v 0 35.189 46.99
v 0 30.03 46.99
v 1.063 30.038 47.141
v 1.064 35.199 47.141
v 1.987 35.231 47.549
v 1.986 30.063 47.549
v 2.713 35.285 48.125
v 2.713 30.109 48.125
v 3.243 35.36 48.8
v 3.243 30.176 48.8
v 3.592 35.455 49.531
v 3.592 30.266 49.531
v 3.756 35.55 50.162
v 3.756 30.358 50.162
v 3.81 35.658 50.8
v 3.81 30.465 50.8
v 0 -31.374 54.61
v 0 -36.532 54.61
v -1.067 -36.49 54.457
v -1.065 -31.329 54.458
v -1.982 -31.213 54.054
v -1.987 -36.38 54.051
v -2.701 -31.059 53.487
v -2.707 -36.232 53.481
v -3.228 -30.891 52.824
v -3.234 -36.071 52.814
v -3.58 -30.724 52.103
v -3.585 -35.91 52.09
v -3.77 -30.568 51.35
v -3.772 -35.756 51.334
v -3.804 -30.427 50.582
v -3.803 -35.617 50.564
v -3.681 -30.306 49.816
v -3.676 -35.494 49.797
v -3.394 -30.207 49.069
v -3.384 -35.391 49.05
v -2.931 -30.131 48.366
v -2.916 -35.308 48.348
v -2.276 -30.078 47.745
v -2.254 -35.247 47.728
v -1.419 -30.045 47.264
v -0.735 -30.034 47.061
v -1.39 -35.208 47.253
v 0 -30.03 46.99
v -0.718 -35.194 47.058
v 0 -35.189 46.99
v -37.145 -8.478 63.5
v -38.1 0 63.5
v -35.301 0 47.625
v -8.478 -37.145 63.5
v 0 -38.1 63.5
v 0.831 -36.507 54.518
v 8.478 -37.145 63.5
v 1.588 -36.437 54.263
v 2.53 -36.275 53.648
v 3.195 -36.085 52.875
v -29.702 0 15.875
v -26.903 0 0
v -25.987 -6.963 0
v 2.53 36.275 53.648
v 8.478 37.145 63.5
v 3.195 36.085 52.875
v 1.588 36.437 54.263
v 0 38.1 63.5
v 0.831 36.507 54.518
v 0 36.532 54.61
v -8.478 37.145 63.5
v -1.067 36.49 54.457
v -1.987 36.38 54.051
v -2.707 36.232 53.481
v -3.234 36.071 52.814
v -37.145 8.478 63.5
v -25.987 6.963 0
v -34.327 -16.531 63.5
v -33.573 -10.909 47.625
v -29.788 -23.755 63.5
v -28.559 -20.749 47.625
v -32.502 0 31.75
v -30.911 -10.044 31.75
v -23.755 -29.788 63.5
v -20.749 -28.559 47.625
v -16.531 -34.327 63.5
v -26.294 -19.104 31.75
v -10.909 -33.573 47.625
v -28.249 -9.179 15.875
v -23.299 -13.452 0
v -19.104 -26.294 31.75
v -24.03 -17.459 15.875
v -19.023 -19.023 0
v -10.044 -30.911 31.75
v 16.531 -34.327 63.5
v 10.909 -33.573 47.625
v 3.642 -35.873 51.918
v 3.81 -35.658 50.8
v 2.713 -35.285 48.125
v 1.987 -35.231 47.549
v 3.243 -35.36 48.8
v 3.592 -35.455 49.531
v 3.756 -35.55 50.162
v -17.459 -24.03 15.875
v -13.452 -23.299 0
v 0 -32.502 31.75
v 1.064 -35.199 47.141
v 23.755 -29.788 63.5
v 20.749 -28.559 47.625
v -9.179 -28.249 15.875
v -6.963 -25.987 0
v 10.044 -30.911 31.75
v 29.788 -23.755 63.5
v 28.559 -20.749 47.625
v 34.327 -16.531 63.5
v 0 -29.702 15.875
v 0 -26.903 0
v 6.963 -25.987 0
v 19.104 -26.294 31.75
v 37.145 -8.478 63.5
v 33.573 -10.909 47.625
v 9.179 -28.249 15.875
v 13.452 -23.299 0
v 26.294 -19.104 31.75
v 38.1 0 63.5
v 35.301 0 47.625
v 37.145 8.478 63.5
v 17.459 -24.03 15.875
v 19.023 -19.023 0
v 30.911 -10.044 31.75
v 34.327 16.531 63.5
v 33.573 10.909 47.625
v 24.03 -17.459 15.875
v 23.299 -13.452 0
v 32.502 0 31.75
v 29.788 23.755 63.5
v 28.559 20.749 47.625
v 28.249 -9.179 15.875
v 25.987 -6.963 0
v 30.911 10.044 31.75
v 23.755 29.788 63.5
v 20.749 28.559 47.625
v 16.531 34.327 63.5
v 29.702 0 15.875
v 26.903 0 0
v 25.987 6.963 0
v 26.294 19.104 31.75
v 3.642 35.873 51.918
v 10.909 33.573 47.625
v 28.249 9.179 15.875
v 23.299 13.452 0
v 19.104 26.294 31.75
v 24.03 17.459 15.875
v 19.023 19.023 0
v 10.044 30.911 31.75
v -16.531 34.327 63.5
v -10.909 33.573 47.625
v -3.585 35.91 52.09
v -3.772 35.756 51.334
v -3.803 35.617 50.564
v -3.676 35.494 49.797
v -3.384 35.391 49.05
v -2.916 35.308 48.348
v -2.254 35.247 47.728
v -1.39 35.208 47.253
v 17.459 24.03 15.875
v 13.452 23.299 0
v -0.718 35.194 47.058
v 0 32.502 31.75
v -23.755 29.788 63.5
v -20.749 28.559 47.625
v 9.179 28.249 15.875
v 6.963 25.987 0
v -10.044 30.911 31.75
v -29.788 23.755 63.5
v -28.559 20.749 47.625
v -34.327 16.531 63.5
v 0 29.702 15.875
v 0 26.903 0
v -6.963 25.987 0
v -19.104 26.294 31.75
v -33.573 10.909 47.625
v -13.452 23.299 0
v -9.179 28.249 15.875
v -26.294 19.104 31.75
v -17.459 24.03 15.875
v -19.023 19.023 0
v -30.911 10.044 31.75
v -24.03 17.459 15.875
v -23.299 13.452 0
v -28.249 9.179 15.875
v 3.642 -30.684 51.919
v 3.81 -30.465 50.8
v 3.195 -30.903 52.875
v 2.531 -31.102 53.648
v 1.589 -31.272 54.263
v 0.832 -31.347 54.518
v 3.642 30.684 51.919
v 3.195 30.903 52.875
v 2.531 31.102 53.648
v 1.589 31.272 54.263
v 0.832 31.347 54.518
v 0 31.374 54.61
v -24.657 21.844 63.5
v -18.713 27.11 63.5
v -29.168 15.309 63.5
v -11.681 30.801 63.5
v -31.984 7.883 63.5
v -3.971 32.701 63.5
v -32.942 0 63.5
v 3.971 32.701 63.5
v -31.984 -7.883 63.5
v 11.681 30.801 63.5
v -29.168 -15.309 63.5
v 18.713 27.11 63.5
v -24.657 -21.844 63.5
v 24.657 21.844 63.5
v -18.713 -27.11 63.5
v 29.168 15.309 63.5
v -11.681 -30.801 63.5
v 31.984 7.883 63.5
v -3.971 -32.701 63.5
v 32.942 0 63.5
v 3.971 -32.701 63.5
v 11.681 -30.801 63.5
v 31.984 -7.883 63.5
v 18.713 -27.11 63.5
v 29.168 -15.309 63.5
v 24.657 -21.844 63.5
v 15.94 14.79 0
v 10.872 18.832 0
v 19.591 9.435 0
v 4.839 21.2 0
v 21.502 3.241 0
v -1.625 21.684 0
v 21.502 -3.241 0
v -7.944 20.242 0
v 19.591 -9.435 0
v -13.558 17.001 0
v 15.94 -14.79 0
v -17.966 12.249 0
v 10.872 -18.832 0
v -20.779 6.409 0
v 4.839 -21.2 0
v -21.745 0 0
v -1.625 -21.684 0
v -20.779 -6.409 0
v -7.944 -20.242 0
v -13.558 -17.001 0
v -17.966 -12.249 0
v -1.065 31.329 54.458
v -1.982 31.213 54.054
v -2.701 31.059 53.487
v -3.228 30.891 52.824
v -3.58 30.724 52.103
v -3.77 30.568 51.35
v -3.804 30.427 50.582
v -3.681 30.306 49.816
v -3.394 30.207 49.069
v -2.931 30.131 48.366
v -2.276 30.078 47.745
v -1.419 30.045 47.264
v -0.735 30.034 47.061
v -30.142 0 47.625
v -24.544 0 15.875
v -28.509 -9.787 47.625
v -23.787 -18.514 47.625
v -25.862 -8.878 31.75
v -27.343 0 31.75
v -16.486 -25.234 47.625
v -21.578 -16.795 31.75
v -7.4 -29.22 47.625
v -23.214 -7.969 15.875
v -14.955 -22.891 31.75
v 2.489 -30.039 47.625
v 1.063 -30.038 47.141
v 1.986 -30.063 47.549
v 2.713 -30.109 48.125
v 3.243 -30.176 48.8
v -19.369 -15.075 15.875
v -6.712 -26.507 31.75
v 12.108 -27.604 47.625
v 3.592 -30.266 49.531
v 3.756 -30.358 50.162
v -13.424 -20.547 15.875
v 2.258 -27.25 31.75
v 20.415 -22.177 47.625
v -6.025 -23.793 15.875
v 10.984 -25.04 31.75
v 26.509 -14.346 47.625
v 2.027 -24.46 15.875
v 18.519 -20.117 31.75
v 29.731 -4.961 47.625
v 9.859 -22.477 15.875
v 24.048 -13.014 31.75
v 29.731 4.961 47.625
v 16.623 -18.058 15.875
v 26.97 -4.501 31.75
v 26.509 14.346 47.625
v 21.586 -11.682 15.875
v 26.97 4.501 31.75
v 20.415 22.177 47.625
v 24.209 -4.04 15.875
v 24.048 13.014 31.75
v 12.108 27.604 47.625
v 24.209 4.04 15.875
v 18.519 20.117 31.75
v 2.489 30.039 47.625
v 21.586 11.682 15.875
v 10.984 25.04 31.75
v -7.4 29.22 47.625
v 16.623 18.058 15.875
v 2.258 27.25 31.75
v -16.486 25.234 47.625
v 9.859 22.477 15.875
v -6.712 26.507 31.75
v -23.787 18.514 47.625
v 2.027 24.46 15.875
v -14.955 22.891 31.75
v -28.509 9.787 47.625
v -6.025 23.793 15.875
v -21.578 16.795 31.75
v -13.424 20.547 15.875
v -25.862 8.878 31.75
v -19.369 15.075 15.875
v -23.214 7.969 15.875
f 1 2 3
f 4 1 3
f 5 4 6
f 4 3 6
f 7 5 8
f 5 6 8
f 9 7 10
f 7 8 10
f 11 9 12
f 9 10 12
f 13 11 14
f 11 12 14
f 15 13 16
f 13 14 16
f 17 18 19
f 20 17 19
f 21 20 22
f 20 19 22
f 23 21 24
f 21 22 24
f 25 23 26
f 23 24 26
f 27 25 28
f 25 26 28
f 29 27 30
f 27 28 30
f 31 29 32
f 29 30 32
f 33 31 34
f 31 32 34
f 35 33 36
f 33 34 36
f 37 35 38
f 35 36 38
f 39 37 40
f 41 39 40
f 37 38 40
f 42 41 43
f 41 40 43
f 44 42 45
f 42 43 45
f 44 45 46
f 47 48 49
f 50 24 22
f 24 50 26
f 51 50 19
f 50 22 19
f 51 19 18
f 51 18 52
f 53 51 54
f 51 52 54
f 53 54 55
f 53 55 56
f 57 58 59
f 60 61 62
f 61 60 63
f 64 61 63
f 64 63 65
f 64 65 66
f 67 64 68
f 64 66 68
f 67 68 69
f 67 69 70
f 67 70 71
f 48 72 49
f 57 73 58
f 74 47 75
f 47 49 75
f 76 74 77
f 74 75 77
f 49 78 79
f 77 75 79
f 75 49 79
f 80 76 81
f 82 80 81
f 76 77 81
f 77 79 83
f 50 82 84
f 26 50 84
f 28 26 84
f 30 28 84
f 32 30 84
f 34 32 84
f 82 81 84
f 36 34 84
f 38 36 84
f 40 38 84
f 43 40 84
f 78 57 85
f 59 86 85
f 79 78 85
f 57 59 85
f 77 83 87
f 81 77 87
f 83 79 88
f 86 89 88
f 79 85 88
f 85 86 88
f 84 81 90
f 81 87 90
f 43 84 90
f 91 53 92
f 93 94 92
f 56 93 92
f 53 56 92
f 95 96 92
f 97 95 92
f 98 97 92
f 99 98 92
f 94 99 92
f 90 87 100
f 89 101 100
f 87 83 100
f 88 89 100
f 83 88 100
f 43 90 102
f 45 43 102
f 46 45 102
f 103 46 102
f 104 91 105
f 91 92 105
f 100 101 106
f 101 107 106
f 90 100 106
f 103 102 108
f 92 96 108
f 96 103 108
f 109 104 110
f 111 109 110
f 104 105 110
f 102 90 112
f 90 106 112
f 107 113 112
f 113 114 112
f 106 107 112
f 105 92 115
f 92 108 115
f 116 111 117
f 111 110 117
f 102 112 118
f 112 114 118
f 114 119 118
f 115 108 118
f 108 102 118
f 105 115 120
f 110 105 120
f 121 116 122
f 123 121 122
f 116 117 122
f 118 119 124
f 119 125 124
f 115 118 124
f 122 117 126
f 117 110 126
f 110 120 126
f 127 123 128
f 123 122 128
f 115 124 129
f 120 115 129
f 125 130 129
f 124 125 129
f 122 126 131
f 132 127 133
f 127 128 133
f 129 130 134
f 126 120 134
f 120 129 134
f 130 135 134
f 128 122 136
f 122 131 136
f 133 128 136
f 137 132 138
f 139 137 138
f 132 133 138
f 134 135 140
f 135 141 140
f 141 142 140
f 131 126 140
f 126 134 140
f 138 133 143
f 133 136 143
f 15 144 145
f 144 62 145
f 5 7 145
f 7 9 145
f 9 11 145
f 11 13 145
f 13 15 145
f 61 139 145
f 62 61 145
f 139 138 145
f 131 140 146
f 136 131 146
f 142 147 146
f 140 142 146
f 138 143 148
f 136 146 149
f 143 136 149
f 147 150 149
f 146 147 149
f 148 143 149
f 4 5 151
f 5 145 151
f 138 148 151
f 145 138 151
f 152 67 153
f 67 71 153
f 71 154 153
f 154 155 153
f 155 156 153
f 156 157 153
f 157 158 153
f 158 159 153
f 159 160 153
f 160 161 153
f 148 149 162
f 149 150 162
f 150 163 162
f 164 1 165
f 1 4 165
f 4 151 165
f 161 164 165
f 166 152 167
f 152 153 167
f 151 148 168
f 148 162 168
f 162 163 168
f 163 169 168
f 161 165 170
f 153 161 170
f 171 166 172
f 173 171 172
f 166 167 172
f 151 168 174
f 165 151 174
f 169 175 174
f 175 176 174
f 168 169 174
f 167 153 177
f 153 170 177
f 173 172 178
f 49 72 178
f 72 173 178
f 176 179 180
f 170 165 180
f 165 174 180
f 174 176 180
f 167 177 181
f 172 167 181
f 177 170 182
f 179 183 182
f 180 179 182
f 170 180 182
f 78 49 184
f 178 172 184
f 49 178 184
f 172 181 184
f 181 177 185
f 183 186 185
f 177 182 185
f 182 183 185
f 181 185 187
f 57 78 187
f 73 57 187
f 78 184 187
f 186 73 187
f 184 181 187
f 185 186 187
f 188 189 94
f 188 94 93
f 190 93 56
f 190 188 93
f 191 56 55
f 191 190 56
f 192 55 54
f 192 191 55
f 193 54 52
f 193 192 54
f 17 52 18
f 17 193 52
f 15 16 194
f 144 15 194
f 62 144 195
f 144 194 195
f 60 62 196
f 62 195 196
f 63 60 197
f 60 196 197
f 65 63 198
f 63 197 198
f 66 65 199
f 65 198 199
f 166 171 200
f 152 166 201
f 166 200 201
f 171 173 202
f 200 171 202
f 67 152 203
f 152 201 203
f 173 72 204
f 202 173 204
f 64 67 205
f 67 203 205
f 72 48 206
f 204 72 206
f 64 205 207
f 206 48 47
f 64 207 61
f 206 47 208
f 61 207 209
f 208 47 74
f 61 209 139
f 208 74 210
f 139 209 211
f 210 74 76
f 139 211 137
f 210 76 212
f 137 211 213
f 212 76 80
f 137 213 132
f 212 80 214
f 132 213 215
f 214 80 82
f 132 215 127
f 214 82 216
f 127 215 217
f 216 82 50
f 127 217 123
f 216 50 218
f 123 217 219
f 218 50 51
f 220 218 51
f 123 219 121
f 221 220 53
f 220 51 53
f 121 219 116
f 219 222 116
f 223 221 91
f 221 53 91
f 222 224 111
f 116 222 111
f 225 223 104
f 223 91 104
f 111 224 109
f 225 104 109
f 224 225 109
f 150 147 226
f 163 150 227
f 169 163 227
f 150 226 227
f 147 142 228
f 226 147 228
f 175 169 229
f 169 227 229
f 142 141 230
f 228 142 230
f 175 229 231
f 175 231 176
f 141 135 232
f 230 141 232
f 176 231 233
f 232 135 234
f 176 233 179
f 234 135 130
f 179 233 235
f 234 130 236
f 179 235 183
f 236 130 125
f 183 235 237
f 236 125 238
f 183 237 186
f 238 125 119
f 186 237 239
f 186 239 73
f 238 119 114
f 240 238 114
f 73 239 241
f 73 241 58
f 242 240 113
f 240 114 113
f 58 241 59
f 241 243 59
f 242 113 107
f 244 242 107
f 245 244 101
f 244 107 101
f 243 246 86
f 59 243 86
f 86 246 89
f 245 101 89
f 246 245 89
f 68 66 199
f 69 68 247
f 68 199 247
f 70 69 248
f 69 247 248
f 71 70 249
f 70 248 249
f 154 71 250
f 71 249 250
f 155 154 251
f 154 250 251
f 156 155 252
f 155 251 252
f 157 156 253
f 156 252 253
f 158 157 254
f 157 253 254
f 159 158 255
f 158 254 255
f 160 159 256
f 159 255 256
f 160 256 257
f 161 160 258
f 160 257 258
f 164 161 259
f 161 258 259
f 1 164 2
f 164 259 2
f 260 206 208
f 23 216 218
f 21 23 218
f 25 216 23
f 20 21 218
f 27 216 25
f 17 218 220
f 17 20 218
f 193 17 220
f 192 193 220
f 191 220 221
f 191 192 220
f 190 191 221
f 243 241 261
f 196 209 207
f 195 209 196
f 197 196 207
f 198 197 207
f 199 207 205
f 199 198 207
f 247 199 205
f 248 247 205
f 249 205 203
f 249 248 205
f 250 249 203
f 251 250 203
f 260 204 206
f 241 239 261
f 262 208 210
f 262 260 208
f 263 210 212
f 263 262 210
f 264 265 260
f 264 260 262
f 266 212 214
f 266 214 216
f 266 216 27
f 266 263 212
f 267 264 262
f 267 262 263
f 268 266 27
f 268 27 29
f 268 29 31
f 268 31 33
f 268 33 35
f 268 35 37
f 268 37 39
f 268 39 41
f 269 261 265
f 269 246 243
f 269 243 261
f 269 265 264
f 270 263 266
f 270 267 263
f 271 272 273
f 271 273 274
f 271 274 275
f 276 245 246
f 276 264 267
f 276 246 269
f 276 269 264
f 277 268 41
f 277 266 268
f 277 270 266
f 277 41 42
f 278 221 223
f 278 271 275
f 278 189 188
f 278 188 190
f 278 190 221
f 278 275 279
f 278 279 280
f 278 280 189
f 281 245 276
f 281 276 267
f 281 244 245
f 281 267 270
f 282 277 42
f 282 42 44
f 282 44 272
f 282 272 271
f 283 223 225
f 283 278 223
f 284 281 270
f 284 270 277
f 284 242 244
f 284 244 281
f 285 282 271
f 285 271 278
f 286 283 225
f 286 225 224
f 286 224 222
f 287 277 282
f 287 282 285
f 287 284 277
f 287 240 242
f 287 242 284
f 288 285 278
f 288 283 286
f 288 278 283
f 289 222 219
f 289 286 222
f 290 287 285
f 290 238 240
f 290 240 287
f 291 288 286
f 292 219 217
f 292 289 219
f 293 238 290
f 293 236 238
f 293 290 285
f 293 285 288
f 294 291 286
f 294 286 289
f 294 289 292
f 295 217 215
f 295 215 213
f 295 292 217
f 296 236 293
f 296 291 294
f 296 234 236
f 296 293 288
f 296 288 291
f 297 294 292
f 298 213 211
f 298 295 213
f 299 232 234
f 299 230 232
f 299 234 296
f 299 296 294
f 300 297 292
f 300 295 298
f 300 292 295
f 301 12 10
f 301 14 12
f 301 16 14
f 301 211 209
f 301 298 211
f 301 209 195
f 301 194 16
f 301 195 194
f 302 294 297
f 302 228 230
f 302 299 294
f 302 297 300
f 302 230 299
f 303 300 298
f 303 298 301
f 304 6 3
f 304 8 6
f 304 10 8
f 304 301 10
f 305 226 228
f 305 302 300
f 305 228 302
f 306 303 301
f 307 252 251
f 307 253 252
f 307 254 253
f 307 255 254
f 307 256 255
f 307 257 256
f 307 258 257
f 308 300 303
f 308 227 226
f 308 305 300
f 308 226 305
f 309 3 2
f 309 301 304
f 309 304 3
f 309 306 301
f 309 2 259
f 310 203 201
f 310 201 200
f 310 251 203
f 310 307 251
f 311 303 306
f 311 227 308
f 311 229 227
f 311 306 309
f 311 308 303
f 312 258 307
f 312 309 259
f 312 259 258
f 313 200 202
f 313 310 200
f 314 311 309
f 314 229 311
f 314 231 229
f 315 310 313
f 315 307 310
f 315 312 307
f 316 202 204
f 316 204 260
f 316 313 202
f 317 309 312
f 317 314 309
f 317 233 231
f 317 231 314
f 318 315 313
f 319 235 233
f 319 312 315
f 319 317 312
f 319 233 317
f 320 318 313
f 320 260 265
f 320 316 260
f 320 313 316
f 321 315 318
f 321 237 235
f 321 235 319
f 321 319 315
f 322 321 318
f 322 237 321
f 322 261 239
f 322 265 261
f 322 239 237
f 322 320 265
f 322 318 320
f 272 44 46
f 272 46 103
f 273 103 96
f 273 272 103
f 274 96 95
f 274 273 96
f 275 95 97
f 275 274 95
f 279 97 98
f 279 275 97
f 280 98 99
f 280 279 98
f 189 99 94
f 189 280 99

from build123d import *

# Parameters (mm, degrees)
F3_DEPTH = 78.74


with BuildPart() as f1:
    # F0 (on Front) → F1 (revolve)
    with BuildSketch(Plane.XZ):
        with BuildLine():
            Line((0, 54.61), (0, 63.5))
            Line((0, 63.5), (-32.9416328116, 63.5))
            Line((-32.9416328116, 63.5), (-21.7448695366, 0))
            Line((-21.7448695366, 0), (0, 0))
            Line((0, 0), (0, 46.99))
            ThreePointArc((0, 46.99), (-3.81, 50.8), (0, 54.61))
        make_face()
        Polygon((-21.7448695366, 0), (-32.9416328116, 63.5), (-38.1, 63.5), (-26.903236725, 0), align=None)
    revolve(axis=Axis((0, 0, 31.75), (0, 0, 1)))

    # F0 (on Front) → F2 (revolve, cut)
    with BuildSketch(Plane.XZ):
        with BuildLine():
            Line((0, 54.61), (0, 63.5))
            Line((0, 63.5), (-32.9416328116, 63.5))
            Line((-32.9416328116, 63.5), (-21.7448695366, 0))
            Line((-21.7448695366, 0), (0, 0))
            Line((0, 0), (0, 46.99))
            ThreePointArc((0, 46.99), (-3.81, 50.8), (0, 54.61))
        make_face()
    revolve(axis=Axis((0, 0, 31.75), (0, 0, 1)), mode=Mode.SUBTRACT)

    # F0 (on Front) → F3 (cut, symmetric)
    with BuildSketch(Plane.XZ):
        with BuildLine():
            Line((0, 46.99), (0, 54.61))
            ThreePointArc((0, 54.61), (-3.81, 50.8), (0, 46.99))
        make_face()
        with BuildLine():
            ThreePointArc((3.81, 50.8), (2.6940768363, 53.4940768363), (0, 54.61))
            Line((0, 54.61), (0, 46.99))
            ThreePointArc((0, 46.99), (2.6940768363, 48.1059231637), (3.81, 50.8))
        make_face()
    extrude(amount=F3_DEPTH, both=True, mode=Mode.SUBTRACT)


solid = f1.part
